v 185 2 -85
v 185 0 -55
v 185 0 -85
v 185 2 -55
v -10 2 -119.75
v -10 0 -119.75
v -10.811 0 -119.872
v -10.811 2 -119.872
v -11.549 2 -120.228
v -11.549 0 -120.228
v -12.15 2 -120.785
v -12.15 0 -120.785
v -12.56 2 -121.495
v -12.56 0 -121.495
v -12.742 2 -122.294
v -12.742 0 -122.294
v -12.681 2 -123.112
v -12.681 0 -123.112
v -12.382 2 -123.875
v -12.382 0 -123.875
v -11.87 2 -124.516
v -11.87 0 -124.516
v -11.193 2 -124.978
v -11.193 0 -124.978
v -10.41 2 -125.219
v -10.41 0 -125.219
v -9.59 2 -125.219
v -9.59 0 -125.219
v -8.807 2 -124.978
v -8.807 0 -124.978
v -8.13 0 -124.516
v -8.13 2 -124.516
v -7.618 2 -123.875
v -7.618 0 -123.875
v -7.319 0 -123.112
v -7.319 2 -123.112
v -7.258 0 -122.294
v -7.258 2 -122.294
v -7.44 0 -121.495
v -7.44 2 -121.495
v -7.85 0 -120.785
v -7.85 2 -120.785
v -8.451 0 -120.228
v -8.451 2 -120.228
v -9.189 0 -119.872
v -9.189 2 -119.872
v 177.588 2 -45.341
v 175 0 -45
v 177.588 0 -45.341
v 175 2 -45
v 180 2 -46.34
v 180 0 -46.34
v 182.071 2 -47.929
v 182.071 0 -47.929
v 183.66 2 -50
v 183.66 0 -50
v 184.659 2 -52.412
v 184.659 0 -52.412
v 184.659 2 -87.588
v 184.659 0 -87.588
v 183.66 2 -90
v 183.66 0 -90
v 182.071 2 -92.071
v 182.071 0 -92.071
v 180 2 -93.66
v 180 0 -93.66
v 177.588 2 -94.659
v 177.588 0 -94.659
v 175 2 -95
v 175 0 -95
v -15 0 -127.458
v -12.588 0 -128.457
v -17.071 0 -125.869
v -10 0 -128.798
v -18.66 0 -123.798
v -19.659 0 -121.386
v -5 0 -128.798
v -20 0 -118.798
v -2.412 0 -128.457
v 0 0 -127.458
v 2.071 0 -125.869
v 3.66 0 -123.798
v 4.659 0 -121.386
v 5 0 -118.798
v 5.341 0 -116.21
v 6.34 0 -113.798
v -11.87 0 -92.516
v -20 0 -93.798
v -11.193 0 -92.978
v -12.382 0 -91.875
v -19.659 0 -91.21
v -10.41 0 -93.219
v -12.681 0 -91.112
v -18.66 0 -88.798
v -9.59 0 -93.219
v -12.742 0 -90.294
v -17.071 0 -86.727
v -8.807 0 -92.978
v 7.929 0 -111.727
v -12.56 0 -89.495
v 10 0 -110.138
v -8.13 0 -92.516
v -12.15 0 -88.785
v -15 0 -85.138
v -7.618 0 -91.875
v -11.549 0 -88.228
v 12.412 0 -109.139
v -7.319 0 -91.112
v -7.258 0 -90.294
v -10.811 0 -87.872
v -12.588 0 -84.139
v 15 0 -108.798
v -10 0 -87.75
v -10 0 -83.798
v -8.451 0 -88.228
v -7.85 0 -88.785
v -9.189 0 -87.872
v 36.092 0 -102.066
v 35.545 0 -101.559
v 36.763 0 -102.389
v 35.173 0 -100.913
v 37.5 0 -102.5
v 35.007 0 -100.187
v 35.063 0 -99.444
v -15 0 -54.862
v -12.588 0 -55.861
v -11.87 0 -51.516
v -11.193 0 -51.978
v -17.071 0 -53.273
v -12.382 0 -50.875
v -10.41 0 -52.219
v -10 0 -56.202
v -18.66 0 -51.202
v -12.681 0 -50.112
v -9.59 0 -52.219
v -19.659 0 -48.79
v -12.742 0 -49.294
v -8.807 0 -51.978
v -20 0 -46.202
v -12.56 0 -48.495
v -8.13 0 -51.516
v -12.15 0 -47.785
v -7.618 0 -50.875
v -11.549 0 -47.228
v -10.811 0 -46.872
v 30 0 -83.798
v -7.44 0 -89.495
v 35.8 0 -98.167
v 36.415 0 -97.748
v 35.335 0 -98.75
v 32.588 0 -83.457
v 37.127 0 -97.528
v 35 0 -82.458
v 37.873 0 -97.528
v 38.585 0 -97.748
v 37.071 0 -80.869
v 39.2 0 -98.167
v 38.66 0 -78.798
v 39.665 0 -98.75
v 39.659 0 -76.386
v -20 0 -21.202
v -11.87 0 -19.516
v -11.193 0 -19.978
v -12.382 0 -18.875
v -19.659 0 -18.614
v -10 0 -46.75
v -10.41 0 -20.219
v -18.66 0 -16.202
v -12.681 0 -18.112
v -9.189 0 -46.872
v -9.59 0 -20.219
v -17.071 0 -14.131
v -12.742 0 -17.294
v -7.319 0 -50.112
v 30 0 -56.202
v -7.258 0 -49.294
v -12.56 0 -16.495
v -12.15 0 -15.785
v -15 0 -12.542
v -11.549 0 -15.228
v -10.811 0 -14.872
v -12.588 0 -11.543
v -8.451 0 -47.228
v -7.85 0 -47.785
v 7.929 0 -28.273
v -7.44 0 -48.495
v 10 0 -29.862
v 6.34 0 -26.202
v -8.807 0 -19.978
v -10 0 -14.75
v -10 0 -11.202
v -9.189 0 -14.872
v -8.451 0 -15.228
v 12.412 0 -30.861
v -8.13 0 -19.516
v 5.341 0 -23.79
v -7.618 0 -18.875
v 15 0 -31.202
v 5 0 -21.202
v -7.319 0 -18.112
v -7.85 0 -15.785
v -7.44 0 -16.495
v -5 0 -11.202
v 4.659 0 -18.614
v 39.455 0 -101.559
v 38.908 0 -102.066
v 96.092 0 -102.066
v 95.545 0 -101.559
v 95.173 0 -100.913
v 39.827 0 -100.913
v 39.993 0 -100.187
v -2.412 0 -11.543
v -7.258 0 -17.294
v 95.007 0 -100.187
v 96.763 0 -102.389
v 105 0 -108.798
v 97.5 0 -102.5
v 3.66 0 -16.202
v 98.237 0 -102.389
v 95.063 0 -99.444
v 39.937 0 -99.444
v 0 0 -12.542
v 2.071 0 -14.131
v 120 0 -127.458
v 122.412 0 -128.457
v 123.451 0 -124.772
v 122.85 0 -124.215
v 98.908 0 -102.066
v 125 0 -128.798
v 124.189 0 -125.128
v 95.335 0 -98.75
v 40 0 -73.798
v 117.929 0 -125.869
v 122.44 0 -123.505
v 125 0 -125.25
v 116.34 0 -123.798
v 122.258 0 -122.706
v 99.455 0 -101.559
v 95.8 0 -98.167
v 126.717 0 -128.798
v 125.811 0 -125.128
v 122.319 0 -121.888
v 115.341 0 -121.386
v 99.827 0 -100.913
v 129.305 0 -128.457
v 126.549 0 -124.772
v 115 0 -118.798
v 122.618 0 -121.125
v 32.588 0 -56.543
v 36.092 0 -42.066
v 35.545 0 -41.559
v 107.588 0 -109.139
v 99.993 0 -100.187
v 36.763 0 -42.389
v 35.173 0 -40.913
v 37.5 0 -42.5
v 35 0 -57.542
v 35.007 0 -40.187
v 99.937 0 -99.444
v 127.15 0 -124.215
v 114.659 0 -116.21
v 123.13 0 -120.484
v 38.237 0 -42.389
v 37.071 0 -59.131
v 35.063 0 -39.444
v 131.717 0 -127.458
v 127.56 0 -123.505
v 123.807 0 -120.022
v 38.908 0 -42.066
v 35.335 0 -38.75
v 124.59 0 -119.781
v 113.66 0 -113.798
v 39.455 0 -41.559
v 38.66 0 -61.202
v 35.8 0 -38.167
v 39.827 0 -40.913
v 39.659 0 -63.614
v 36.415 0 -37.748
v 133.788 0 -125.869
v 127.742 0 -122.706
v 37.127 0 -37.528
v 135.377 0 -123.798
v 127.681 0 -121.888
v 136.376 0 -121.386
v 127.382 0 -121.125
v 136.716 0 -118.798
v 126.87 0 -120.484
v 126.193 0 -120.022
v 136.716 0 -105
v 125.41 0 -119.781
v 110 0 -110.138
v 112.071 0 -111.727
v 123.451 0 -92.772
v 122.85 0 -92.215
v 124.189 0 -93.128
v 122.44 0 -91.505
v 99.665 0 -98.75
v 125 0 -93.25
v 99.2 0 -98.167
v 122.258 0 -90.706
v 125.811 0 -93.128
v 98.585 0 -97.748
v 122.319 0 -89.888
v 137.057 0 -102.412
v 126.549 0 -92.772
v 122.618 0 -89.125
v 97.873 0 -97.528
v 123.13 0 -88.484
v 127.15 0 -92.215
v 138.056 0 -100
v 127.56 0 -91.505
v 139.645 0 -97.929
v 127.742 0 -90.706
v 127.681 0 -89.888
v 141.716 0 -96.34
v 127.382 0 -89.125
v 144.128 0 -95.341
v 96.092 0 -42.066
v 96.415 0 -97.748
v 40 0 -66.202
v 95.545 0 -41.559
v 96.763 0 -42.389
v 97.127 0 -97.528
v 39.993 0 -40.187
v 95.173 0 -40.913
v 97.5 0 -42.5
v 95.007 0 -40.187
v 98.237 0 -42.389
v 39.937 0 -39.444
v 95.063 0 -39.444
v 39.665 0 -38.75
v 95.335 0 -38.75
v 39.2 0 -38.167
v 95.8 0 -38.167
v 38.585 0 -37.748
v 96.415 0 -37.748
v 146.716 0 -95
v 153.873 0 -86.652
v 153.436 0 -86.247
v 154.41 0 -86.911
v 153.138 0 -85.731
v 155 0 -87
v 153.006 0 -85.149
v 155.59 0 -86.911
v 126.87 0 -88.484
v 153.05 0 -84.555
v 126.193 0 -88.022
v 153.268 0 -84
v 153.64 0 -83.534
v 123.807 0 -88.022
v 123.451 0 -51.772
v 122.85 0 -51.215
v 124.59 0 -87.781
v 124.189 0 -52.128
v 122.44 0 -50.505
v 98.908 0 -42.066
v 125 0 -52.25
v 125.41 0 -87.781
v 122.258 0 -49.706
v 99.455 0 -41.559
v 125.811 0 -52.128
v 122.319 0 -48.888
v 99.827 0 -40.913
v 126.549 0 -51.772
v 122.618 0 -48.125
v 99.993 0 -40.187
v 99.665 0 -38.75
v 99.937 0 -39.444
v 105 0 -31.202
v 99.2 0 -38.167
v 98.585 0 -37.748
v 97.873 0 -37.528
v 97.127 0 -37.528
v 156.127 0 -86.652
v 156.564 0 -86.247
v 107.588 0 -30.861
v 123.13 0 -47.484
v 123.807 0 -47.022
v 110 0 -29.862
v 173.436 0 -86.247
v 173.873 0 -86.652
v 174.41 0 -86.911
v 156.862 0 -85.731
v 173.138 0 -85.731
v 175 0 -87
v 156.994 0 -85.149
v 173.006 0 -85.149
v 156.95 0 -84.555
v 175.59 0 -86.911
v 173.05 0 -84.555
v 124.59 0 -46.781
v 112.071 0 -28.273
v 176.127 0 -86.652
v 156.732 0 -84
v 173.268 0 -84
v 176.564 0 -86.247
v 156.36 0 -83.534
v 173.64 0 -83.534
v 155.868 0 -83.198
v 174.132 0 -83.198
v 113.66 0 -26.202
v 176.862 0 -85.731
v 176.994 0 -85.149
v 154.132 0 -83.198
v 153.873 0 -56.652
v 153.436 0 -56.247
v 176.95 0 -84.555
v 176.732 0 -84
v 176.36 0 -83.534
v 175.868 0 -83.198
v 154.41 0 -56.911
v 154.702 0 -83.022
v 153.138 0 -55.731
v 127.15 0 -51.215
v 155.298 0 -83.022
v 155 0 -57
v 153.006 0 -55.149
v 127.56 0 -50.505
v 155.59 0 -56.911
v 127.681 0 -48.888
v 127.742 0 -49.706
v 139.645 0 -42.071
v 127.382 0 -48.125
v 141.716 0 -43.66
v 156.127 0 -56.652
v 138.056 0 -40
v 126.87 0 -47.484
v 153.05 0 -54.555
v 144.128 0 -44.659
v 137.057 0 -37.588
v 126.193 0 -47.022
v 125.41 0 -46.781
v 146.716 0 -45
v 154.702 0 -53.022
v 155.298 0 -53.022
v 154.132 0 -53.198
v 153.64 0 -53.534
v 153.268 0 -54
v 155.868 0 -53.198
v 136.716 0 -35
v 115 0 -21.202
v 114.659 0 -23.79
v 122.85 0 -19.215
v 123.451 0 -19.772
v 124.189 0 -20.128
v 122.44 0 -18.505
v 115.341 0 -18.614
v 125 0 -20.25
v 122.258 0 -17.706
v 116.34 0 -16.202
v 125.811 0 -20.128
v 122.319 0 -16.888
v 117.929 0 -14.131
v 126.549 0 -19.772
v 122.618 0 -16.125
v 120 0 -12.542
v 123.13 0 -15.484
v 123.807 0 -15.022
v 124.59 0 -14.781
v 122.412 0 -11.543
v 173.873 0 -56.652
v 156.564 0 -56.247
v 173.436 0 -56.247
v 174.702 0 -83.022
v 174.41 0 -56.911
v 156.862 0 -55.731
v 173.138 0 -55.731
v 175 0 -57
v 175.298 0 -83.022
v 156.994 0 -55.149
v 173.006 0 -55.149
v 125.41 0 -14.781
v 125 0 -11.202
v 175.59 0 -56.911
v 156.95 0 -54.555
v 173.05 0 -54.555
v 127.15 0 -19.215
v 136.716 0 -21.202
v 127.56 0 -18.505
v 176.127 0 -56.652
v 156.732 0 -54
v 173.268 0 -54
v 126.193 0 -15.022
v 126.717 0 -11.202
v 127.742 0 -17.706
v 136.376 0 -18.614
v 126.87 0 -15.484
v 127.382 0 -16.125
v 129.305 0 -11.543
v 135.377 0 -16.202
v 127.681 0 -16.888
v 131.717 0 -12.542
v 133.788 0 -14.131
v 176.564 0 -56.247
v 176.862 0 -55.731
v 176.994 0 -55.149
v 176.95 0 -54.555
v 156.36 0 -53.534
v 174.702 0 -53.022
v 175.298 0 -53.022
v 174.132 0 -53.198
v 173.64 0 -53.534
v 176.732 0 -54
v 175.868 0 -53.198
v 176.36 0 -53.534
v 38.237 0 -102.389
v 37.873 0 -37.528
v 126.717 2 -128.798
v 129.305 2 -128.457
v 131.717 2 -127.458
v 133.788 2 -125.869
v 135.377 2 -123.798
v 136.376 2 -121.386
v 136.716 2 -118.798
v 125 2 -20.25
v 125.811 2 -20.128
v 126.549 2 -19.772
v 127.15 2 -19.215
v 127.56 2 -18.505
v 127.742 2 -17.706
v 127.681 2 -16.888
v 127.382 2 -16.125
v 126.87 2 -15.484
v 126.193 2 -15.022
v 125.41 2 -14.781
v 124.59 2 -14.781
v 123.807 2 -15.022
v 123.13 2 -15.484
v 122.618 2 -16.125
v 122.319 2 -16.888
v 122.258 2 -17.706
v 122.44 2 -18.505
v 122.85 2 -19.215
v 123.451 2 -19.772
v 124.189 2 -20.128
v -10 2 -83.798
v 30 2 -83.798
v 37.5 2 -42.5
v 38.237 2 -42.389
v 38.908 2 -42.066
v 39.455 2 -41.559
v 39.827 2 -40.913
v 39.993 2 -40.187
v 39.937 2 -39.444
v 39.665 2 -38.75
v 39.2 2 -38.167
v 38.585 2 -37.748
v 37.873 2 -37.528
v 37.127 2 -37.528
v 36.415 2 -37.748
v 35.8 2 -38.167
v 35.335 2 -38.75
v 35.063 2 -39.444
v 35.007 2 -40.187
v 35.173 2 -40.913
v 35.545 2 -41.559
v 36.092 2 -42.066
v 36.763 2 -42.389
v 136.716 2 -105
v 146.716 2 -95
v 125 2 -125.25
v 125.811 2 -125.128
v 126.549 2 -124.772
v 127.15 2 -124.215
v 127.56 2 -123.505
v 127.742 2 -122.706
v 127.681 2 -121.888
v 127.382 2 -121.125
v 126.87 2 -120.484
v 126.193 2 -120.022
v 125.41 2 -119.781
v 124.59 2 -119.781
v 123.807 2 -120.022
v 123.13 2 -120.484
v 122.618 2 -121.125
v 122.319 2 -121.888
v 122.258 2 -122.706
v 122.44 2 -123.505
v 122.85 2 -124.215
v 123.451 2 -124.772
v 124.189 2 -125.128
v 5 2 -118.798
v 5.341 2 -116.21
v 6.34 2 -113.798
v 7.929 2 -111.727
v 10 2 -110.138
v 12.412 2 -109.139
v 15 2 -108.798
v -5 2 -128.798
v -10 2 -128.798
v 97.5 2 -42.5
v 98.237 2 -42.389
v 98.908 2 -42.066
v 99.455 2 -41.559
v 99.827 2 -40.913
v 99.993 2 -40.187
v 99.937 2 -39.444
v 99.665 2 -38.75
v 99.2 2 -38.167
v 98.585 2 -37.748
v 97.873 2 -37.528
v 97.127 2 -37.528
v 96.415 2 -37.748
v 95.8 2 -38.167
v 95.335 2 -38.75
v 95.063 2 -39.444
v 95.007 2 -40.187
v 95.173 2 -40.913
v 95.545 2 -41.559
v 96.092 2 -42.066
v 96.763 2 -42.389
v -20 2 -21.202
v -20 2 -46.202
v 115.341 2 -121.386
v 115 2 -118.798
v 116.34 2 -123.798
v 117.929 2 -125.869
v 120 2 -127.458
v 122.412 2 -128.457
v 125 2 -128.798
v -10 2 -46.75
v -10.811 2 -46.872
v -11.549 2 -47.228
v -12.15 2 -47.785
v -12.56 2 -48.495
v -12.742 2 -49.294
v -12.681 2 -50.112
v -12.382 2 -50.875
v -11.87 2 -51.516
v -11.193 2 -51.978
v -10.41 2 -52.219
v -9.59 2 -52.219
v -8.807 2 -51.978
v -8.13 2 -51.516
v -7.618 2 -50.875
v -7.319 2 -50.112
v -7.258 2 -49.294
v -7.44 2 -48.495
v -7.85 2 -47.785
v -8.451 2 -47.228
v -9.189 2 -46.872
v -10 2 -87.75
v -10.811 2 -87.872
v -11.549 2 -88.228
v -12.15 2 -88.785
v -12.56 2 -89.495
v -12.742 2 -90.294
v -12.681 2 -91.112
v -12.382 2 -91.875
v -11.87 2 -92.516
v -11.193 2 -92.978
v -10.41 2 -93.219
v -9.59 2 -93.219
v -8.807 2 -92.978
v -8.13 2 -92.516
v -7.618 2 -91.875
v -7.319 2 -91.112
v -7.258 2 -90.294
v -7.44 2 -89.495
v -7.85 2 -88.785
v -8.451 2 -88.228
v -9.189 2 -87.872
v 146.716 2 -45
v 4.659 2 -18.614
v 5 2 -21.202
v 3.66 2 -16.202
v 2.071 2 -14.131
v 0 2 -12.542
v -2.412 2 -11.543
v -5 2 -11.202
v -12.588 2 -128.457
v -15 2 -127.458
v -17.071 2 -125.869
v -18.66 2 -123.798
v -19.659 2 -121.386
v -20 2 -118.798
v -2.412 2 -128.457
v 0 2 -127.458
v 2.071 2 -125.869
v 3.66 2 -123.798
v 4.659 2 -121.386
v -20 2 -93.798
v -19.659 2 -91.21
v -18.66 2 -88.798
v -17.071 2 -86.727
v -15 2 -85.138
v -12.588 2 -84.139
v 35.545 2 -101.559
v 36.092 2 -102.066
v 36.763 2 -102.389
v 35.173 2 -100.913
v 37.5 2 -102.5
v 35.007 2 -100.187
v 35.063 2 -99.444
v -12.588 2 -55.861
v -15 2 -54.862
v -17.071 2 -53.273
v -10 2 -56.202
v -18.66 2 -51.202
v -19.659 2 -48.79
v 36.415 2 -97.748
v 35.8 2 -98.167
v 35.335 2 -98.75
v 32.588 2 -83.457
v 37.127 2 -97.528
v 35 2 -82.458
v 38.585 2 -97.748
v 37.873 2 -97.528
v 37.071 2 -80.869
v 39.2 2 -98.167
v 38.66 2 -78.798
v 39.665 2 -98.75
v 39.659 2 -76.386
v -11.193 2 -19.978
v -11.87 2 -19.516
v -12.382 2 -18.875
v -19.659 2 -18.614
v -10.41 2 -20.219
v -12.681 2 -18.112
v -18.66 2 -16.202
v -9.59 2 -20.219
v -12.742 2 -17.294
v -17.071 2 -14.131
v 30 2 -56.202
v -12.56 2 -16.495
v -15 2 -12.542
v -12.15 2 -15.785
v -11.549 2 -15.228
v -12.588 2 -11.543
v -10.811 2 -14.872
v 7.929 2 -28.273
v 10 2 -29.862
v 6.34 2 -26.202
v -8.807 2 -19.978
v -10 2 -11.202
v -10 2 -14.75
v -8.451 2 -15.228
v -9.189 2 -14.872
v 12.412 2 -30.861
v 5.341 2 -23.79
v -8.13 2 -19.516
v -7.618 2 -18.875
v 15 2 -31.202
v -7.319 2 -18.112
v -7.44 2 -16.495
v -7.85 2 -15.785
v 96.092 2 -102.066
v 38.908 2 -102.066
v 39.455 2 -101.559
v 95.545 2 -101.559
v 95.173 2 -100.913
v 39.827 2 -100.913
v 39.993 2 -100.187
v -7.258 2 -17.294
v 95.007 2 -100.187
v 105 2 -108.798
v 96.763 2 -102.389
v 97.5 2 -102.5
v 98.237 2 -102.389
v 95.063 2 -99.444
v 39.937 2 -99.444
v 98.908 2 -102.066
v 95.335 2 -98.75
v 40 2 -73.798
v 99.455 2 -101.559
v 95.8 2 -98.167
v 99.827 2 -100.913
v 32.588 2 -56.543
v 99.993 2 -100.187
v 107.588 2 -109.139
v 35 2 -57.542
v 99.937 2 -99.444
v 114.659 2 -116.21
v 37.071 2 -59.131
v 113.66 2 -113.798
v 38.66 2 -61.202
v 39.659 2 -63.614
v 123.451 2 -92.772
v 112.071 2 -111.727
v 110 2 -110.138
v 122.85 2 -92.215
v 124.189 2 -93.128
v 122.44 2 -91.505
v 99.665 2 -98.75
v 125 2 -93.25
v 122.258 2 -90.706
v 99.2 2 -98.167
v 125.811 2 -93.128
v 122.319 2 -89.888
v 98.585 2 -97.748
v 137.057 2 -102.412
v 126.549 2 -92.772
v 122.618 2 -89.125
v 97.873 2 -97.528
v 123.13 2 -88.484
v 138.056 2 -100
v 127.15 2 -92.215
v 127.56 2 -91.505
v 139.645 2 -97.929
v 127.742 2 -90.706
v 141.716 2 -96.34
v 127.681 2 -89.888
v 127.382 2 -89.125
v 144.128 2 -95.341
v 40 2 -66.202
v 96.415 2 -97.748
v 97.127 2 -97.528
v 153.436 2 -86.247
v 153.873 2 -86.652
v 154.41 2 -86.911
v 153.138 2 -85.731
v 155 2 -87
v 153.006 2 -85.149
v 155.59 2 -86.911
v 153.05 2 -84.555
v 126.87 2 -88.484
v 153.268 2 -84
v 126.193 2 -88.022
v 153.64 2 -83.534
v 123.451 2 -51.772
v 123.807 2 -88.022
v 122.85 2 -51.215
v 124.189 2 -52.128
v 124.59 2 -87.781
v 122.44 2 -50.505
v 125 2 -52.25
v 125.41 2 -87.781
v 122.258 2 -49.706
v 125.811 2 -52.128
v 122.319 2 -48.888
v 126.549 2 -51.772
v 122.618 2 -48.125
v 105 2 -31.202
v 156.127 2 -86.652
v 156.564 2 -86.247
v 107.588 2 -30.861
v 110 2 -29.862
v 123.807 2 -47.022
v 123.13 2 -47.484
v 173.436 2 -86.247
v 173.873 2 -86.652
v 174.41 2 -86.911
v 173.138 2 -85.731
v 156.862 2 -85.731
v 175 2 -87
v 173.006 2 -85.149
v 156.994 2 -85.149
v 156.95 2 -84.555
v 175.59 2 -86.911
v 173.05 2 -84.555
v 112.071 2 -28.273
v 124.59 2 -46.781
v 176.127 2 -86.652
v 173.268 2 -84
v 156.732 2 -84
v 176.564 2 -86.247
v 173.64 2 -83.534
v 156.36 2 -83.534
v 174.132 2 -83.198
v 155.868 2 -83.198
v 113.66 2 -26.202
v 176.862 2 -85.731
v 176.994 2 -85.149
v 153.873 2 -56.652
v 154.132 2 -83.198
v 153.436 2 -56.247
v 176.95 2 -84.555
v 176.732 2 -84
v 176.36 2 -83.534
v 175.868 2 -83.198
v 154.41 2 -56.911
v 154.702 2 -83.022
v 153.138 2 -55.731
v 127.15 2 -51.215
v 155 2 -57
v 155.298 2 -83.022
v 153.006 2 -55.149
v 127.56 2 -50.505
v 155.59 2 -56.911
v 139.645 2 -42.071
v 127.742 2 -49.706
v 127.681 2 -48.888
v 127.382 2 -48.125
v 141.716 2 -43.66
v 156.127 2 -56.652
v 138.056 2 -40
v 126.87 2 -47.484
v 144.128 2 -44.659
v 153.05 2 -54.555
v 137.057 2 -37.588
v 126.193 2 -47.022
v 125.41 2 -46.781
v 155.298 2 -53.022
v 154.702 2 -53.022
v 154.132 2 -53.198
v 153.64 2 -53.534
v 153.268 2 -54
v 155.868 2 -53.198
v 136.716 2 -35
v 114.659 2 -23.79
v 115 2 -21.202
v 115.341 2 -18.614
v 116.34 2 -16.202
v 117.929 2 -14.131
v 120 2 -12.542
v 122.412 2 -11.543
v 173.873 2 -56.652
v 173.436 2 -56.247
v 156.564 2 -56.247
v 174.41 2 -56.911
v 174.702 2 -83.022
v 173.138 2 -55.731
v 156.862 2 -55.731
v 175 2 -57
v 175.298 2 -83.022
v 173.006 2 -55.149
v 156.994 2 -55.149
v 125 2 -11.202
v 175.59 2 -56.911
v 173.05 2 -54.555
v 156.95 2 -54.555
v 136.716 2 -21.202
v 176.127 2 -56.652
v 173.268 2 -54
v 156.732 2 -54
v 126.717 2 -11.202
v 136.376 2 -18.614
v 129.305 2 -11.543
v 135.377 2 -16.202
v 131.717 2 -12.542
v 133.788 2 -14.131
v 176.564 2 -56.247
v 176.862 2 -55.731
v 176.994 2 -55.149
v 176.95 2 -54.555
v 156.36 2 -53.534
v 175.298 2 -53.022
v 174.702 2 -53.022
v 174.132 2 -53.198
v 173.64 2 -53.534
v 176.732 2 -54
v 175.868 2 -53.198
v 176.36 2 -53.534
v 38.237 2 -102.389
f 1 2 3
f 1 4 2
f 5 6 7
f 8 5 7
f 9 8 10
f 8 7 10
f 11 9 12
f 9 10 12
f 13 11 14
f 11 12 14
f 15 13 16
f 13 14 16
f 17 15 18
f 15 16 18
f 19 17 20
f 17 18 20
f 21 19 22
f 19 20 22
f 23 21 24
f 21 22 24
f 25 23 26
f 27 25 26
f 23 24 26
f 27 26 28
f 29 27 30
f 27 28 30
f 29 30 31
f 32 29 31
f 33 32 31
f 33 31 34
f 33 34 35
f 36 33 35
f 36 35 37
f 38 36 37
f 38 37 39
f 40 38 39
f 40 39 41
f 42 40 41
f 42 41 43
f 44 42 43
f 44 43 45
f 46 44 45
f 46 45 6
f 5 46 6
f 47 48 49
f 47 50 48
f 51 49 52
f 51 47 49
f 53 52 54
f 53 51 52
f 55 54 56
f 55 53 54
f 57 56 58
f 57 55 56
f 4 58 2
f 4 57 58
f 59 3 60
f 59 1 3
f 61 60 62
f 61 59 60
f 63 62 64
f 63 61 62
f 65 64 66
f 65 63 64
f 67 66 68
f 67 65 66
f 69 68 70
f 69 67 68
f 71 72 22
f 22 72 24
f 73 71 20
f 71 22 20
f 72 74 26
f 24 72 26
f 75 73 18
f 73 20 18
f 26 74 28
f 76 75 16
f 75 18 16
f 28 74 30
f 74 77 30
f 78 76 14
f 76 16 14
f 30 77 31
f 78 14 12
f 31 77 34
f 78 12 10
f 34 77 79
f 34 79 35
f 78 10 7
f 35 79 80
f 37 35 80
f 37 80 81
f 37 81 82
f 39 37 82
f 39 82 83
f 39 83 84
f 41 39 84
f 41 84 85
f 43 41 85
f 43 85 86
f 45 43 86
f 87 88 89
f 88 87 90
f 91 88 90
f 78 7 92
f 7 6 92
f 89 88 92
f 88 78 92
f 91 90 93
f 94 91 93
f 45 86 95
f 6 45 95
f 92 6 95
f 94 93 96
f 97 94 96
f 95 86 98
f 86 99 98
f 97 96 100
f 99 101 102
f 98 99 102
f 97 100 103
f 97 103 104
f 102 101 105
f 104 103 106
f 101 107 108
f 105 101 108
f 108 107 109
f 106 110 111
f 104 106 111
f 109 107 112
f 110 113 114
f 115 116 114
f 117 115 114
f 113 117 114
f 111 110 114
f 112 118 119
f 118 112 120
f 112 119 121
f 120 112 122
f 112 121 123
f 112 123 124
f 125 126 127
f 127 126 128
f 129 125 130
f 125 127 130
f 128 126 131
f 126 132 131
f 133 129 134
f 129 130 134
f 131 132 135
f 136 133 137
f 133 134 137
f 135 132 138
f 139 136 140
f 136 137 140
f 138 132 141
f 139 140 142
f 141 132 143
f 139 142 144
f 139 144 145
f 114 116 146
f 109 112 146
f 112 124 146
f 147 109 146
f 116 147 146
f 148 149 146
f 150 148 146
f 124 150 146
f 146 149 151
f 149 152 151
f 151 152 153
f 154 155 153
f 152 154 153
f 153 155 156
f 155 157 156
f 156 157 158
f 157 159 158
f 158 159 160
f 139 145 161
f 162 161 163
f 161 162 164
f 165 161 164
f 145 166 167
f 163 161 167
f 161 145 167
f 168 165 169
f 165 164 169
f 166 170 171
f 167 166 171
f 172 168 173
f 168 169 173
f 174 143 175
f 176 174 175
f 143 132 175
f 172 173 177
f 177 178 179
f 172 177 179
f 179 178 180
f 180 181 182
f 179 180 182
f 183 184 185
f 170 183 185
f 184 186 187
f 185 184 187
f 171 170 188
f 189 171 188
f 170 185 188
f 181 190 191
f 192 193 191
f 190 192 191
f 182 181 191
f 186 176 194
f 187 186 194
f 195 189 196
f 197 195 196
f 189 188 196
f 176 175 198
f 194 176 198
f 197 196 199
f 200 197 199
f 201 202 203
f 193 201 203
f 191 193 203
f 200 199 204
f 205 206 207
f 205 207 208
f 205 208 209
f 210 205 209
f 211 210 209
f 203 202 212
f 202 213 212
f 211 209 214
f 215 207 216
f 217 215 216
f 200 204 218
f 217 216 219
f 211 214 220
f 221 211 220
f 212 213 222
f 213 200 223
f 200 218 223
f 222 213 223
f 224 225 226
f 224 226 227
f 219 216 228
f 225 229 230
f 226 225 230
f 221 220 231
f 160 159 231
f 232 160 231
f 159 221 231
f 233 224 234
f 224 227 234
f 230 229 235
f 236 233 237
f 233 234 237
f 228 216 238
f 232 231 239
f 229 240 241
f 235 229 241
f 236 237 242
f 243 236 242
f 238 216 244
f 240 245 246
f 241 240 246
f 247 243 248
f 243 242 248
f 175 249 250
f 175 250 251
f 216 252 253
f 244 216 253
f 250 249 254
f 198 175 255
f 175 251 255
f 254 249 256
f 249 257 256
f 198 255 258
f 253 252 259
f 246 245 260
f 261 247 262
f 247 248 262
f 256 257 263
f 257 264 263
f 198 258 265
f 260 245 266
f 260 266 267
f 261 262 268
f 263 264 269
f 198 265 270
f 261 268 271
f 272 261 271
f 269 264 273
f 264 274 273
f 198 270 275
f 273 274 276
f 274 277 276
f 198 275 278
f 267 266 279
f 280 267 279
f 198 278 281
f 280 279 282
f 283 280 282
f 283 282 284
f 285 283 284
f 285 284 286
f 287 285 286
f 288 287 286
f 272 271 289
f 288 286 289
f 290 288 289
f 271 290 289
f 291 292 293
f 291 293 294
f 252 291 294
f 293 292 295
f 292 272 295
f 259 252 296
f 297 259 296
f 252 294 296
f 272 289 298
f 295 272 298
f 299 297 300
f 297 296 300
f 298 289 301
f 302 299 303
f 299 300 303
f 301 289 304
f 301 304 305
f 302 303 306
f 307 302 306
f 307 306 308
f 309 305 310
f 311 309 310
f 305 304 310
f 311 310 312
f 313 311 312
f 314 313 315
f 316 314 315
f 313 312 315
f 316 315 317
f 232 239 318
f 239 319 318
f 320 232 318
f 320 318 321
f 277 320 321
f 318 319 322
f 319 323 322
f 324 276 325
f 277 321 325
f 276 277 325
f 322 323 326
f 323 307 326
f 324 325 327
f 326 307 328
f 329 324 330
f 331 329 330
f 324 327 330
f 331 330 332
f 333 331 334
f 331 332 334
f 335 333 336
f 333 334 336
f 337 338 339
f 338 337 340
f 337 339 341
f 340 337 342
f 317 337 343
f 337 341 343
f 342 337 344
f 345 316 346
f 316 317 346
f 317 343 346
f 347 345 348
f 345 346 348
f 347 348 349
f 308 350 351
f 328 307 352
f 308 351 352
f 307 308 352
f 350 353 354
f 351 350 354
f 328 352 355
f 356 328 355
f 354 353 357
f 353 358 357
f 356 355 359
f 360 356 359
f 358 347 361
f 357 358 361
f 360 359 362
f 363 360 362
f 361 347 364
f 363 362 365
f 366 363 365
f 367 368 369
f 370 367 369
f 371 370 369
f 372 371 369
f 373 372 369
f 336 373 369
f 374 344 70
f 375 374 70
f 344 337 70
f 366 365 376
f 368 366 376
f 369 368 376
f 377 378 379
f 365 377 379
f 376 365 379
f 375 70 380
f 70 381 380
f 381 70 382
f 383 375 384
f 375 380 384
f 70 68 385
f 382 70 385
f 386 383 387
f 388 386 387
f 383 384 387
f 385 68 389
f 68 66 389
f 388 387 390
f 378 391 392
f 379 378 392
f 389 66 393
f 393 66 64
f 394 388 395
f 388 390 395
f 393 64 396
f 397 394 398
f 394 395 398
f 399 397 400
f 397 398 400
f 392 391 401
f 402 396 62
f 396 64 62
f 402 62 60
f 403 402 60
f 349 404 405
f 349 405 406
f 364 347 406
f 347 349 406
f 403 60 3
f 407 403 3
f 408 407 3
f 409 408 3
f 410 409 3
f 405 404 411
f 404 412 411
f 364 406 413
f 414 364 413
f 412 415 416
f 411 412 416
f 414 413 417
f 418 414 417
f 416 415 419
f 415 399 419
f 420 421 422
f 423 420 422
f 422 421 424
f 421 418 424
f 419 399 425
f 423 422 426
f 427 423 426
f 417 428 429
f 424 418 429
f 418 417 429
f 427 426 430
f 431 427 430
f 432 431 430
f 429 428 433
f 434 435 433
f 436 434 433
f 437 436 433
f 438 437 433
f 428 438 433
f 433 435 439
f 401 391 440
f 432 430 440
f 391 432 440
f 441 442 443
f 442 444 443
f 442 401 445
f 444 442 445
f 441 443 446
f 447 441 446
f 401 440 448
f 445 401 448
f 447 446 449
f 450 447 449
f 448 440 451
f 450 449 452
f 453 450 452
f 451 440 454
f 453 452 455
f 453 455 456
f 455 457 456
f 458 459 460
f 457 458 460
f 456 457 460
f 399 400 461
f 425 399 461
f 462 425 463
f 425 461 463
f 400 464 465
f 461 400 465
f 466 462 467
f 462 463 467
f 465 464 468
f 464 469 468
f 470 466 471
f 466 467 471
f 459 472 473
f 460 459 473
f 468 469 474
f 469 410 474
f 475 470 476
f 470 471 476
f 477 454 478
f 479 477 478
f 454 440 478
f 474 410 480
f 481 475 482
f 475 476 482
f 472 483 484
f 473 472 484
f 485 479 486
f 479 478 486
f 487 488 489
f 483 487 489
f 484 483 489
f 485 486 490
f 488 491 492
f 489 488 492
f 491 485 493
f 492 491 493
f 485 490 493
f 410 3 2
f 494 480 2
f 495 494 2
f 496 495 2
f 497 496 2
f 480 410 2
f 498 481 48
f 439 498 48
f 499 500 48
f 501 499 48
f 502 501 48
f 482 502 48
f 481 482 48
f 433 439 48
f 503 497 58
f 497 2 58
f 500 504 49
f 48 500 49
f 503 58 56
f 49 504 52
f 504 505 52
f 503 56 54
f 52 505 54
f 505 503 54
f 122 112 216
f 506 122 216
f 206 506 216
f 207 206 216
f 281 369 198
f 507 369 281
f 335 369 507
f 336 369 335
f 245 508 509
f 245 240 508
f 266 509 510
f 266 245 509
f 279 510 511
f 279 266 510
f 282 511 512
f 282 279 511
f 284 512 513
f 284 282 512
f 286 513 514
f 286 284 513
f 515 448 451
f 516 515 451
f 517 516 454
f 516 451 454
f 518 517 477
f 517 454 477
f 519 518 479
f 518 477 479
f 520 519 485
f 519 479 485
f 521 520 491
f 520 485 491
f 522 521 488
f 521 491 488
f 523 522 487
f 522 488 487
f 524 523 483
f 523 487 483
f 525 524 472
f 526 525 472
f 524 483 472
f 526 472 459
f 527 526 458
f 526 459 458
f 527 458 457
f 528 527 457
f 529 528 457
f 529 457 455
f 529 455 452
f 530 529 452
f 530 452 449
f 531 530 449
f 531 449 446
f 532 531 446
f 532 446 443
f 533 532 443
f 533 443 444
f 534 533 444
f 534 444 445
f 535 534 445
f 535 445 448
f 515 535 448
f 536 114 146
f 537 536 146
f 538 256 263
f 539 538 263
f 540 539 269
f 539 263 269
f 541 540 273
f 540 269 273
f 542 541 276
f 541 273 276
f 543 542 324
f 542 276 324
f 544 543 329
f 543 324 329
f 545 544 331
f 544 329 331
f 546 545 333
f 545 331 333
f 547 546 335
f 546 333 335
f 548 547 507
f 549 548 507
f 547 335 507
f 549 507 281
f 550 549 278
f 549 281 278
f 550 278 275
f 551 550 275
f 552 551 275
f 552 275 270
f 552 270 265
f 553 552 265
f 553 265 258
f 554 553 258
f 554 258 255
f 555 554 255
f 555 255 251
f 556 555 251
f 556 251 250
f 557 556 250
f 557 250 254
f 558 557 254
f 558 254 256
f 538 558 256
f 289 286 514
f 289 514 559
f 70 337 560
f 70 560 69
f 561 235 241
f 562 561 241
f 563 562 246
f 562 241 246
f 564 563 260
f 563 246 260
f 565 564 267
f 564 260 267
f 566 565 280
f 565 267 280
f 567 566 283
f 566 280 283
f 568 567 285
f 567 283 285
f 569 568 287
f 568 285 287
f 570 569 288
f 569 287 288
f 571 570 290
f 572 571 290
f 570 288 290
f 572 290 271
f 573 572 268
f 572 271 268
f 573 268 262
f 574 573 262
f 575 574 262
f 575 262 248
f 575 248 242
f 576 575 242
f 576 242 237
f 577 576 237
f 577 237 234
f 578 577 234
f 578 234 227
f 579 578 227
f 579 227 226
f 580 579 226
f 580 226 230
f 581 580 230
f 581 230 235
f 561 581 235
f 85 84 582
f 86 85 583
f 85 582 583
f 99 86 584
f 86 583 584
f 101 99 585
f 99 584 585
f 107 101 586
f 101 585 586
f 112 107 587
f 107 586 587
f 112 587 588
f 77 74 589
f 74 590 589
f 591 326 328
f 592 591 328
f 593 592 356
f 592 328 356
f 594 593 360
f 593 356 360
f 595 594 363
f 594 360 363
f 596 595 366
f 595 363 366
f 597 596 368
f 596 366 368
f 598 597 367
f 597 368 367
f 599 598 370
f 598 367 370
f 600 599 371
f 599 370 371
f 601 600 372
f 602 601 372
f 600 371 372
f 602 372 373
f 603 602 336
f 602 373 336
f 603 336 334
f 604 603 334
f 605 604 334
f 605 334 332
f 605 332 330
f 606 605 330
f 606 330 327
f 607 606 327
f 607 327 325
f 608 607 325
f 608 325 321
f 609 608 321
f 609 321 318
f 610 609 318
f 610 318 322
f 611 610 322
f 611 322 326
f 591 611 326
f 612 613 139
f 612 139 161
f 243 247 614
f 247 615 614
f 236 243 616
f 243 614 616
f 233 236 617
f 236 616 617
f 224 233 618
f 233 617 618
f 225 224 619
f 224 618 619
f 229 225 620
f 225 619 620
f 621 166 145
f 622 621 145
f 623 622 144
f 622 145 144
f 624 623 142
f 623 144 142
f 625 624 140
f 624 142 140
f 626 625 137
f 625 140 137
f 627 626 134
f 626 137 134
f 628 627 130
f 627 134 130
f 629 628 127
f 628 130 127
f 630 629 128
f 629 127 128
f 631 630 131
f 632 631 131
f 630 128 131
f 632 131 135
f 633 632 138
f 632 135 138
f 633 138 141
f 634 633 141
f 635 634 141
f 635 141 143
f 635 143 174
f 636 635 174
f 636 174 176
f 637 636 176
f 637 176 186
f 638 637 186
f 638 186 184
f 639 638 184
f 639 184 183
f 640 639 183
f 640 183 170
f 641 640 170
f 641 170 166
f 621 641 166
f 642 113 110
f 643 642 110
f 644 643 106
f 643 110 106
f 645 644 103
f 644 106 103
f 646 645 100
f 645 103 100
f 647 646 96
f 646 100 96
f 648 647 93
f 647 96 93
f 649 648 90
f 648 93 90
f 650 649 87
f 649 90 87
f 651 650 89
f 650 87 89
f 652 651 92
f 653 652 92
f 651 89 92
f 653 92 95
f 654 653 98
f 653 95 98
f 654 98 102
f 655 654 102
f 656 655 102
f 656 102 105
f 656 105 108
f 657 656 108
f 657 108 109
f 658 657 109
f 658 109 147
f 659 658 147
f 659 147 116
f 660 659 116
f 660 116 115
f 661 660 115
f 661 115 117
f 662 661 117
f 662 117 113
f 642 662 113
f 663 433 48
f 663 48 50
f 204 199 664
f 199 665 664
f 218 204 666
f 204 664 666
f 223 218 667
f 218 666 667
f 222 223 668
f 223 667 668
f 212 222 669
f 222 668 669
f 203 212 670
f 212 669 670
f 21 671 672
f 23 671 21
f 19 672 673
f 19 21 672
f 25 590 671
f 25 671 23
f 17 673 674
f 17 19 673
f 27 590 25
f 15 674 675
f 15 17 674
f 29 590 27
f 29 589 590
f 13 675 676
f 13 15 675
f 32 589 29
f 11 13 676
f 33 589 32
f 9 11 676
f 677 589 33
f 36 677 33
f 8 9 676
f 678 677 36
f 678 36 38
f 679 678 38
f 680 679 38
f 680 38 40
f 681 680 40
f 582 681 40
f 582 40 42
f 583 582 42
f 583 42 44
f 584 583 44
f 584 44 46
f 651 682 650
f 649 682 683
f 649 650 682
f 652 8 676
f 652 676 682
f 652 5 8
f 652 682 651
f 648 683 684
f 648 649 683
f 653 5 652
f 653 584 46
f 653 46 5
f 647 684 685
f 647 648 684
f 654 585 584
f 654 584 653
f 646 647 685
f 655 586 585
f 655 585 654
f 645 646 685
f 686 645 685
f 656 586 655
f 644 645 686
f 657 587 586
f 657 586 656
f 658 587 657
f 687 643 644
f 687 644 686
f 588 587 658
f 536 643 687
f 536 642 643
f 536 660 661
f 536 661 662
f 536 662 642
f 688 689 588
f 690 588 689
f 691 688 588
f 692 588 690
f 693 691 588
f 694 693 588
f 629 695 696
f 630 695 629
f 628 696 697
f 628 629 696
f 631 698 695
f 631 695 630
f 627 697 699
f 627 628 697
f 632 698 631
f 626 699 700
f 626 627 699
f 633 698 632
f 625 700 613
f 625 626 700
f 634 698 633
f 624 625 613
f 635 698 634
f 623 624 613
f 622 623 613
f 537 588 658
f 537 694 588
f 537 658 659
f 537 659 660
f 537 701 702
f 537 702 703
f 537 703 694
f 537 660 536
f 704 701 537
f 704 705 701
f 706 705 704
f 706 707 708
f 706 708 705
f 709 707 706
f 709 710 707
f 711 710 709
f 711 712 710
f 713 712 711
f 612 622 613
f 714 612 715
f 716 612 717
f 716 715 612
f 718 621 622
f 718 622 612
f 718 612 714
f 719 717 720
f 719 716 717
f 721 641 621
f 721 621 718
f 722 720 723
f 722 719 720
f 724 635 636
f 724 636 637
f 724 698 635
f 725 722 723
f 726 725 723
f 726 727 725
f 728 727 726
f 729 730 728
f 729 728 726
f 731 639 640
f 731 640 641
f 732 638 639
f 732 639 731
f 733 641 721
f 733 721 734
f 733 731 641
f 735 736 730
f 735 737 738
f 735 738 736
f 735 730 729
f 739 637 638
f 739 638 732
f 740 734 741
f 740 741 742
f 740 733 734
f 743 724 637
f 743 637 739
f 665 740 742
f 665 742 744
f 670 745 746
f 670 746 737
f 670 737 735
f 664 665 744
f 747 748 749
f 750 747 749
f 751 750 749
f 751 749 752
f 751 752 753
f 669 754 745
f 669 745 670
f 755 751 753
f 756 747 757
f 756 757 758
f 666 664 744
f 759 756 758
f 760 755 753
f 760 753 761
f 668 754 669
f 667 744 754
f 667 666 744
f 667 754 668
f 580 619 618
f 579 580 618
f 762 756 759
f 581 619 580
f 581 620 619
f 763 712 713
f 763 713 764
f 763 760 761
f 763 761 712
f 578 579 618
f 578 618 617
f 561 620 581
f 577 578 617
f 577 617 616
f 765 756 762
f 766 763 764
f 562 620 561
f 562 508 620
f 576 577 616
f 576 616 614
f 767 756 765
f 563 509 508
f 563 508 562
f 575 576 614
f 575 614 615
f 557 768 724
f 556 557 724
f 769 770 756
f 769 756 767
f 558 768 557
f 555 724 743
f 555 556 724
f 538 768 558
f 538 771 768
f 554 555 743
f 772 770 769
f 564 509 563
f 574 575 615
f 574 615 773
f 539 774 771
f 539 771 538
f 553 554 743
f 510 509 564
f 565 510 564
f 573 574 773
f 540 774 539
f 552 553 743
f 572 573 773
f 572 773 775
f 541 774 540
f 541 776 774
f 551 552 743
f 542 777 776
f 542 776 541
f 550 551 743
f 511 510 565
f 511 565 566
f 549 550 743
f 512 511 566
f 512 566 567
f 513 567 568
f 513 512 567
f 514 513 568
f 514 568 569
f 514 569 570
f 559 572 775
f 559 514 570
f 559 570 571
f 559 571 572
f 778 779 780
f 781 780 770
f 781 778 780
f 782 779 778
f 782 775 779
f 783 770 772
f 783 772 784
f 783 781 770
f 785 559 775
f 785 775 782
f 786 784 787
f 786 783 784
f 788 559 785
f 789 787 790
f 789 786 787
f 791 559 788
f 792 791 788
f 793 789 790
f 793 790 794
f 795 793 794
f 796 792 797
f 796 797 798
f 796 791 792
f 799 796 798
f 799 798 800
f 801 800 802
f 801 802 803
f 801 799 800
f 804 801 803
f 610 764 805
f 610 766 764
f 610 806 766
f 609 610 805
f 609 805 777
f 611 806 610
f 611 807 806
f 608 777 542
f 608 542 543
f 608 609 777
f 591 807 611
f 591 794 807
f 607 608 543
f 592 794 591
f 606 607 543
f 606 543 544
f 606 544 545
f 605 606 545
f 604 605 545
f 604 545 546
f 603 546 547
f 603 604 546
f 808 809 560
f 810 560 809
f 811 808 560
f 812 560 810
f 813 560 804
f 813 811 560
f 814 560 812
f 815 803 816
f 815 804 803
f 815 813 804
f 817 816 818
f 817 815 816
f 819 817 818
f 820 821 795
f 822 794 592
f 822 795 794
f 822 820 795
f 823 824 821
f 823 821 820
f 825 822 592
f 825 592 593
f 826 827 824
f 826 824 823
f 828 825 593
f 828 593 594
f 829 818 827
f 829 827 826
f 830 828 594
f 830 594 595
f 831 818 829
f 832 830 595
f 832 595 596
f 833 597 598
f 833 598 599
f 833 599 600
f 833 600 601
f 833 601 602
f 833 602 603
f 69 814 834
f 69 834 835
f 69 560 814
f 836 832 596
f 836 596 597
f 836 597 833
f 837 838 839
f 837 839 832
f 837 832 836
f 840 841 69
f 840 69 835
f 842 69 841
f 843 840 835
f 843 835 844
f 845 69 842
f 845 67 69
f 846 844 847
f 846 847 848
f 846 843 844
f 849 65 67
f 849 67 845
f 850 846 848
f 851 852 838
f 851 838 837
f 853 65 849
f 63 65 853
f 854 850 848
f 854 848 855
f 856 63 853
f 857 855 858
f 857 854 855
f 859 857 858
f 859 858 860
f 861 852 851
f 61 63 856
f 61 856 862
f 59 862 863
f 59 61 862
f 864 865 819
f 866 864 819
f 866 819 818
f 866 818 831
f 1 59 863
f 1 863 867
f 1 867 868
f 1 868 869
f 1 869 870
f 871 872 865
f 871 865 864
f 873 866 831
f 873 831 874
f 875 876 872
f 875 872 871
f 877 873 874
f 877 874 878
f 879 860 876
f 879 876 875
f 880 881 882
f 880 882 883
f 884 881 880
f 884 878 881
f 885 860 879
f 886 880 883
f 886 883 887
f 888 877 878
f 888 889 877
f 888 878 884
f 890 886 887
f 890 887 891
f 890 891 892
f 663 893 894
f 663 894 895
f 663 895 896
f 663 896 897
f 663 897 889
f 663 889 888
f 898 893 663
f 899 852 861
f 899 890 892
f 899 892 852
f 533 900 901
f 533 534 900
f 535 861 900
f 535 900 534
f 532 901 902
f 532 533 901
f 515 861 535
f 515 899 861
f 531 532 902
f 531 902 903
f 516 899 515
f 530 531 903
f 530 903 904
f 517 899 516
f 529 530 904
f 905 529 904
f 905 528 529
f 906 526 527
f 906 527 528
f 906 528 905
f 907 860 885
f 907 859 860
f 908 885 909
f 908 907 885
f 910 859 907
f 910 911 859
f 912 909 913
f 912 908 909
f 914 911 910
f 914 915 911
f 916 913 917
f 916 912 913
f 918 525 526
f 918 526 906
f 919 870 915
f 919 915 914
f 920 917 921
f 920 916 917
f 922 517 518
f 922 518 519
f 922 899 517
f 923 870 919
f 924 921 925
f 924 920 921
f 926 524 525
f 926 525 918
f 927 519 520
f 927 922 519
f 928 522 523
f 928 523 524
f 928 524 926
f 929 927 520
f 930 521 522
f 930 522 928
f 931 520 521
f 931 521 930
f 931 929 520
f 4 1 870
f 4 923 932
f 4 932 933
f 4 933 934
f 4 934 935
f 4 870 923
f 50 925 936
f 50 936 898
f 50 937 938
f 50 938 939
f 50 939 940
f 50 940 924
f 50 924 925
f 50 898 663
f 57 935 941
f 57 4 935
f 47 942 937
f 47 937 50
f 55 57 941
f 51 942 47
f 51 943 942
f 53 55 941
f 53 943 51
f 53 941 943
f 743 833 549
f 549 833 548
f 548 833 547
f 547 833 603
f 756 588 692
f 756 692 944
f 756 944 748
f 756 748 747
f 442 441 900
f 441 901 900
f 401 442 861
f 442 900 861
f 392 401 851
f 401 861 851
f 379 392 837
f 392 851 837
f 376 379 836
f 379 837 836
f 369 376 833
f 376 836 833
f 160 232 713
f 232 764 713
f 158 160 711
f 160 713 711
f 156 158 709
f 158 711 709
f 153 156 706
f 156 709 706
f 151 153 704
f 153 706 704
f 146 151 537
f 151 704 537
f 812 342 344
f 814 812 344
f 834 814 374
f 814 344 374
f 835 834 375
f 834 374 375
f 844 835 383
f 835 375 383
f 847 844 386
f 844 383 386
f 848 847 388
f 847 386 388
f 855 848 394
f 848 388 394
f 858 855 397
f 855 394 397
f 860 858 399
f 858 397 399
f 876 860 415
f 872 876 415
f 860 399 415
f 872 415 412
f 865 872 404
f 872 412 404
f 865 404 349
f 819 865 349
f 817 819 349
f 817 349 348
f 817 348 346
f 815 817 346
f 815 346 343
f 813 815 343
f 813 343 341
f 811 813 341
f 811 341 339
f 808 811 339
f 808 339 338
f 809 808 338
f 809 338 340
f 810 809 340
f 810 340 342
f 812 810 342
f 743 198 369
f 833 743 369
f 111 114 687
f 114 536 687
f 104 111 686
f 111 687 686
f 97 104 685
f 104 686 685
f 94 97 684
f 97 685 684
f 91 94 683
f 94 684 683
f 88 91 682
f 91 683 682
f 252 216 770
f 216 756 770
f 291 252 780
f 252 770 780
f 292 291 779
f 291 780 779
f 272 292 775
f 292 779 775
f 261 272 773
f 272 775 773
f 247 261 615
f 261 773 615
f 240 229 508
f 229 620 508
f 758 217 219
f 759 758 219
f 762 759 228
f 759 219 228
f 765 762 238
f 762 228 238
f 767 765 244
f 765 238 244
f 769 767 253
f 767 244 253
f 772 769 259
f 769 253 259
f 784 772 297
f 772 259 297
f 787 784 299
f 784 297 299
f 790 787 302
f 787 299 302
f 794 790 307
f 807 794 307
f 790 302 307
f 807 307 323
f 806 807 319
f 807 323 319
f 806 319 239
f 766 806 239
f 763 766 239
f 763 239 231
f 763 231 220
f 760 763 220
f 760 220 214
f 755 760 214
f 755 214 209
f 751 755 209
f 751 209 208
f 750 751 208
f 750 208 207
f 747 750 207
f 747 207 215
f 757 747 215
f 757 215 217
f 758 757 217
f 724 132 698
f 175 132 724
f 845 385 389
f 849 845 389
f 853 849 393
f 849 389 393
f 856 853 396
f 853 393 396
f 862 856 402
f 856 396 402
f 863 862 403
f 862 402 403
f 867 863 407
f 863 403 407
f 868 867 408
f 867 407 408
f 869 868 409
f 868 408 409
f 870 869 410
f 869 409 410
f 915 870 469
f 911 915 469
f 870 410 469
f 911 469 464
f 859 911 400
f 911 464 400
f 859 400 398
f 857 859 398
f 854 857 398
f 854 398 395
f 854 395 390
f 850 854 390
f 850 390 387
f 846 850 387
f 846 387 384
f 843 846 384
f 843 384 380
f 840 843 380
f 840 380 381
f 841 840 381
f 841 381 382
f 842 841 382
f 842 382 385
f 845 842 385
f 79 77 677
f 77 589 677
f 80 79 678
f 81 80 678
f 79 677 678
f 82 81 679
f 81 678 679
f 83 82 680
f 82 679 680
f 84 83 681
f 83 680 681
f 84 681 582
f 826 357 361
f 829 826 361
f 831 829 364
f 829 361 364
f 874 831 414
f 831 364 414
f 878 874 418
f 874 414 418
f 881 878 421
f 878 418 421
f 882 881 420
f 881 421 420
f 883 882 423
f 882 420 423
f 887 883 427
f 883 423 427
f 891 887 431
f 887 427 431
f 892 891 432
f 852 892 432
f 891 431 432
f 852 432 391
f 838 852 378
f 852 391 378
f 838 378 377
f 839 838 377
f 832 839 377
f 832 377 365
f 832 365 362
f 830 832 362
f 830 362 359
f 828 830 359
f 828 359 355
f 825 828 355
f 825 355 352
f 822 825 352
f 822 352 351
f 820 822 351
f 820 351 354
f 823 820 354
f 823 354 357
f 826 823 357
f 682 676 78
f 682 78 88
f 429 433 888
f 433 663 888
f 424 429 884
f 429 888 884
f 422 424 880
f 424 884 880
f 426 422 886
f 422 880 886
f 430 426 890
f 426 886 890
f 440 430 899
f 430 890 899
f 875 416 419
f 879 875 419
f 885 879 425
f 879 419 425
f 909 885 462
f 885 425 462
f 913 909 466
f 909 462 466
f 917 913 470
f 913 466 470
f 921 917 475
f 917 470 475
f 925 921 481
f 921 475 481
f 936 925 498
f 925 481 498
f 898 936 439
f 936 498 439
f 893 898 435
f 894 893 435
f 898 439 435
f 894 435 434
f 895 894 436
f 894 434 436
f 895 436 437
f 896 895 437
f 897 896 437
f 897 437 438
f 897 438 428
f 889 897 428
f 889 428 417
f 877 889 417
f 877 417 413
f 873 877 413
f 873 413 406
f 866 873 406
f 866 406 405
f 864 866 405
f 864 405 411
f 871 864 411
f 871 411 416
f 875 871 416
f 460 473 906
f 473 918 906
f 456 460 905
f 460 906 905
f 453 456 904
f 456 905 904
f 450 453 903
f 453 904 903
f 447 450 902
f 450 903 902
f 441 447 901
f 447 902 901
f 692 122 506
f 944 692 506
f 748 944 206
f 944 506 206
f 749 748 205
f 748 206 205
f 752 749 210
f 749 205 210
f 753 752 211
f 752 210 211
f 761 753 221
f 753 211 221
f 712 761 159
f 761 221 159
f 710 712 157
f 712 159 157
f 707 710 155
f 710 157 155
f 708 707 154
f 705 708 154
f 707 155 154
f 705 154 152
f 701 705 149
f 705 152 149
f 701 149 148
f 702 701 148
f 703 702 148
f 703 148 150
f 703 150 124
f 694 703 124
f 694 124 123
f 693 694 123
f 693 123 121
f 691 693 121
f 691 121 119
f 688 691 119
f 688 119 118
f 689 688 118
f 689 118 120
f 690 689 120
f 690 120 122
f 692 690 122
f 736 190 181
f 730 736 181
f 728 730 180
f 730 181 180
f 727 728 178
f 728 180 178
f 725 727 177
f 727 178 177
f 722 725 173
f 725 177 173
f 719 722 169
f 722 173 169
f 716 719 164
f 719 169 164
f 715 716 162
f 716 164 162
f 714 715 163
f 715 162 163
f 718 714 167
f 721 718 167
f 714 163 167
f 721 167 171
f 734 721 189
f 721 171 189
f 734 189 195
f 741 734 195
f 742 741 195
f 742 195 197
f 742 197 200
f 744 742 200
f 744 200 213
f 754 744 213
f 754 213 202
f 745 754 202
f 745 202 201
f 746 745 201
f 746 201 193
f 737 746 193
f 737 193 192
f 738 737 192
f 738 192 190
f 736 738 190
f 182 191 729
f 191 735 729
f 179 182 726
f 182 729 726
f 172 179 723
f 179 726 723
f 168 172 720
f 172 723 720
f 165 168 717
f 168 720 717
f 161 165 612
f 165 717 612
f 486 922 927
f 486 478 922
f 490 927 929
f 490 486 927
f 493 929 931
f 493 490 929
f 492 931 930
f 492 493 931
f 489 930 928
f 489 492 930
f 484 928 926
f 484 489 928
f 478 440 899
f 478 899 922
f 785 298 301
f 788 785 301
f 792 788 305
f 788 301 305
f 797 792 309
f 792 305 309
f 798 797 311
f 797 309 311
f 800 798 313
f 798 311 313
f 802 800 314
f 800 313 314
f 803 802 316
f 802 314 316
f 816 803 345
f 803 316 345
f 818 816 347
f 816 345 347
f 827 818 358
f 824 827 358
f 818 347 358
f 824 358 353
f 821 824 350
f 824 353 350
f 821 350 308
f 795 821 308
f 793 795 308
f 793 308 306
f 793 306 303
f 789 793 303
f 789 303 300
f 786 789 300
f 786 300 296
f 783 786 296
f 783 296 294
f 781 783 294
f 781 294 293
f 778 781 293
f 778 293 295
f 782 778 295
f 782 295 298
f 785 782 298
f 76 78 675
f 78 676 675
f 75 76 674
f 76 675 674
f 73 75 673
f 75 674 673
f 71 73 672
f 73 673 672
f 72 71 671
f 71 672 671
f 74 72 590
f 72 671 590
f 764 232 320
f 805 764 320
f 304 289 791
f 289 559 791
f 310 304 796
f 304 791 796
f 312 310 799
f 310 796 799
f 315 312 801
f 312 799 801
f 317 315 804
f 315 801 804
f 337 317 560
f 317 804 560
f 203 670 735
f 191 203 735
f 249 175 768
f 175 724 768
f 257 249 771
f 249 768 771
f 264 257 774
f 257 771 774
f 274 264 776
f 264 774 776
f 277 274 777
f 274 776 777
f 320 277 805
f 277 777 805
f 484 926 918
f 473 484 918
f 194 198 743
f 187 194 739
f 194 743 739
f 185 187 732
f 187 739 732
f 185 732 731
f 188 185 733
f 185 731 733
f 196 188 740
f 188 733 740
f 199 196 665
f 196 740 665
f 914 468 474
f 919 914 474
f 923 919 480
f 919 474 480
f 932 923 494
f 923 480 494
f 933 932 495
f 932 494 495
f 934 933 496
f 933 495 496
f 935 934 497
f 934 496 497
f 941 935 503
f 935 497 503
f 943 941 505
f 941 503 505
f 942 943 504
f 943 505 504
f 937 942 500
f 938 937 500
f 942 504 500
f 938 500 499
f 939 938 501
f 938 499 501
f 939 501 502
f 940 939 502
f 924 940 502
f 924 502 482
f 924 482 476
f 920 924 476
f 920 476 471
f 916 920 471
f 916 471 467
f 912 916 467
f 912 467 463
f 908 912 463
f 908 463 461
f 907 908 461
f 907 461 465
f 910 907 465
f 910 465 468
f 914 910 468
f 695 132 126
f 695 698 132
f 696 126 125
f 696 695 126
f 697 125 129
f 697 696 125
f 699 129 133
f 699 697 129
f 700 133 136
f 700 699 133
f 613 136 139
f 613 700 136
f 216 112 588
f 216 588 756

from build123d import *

# Parameters (mm, degrees)
SKETCH1_W           = 80
SKETCH1_H           = 140
BOSS_EXTRUDE1_DEPTH = 2
SKETCH4_W           = 140
SKETCH4_H           = 2
BOSS_EXTRUDE2_DEPTH = 35
SKETCH5_W           = 140
SKETCH5_H           = 2
BOSS_EXTRUDE3_DEPTH = 20
SKETCH2_R           = 2.5
CUT_EXTRUDE1_DEPTH  = 10
SKETCH7_W           = 140
SKETCH7_H           = 2
BOSS_EXTRUDE5_DEPTH = 20
SKETCH8_R           = 2.75
CUT_EXTRUDE2_DEPTH  = 10
SKETCH9_W           = 50
SKETCH9_H           = 2
BOSS_EXTRUDE6_DEPTH = 50
SKETCH10_R          = 2
CUT_EXTRUDE3_DEPTH  = 40
CUT_EXTRUDE4_DEPTH  = 40
CHAMFER1_SIZE       = 49.985180236
CHAMFER1_SIZE_2     = 35
SKETCH12_W          = 60
SKETCH12_H          = 27.596233816
CUT_EXTRUDE5_DEPTH  = 10
CUT_EXTRUDE6_DEPTH  = 10
SKETCH14_W          = 110
SKETCH14_H          = 20
CUT_EXTRUDE7_DEPTH  = 10
FILLET1_R           = 10


# Some blends are built 0.0001 mm under size
with BuildPart() as part:
    # Sketch1 → Boss-Extrude1 (new body)
    with BuildSketch(Plane(origin=(0, 0, 0), x_dir=(1, 0, 0), z_dir=(0, 1, 0))):
        with Locations((40, 70)):
            Rectangle(SKETCH1_W, SKETCH1_H)
    extrude(amount=BOSS_EXTRUDE1_DEPTH)

    # Sketch4 → Boss-Extrude2 (add)
    with BuildSketch(Plane(origin=(80, 0, 0), x_dir=(0, 0, -1), z_dir=(1, 0, 0))):
        with Locations((70, 1)):
            Rectangle(SKETCH4_W, SKETCH4_H)
    extrude(amount=BOSS_EXTRUDE2_DEPTH)

    # Sketch5 → Boss-Extrude3 (add)
    with BuildSketch(Plane(origin=(115, 0, 0), x_dir=(0, 0, -1), z_dir=(1, 0, 0))):
        with Locations((70, 1)):
            Rectangle(SKETCH5_W, SKETCH5_H)
    extrude(amount=BOSS_EXTRUDE3_DEPTH)

    # Sketch2 → Cut-Extrude1 (cut)
    with BuildSketch(Plane.XZ):
        with Locations(Location((97.5, -100, 0), (0, 0, 270))):
            Circle(SKETCH2_R)
        with Locations(Location((97.5, -40, 0), (0, 0, 270))):
            Circle(SKETCH2_R)
        with Locations(Location((37.5, -40, 0), (0, 0, 270))):
            Circle(SKETCH2_R)
        with Locations(Location((37.5, -100, 0), (0, 0, 270))):
            Circle(SKETCH2_R)
    extrude(amount=-CUT_EXTRUDE1_DEPTH, mode=Mode.SUBTRACT)

    # Sketch7 → Boss-Extrude5 (add)
    with BuildSketch(Plane.ZY):
        with Locations((-70, 1)):
            Rectangle(SKETCH7_W, SKETCH7_H)
    extrude(amount=BOSS_EXTRUDE5_DEPTH)

    # Sketch8 → Cut-Extrude2 (cut)
    with BuildSketch(Plane.XZ):
        with Locations(Location((125, -17.5, 0), (0, 0, 270))):
            Circle(SKETCH8_R)
        with Locations(Location((125, -49.5, 0), (0, 0, 270))):
            Circle(SKETCH8_R)
        with Locations(Location((125, -90.5, 0), (0, 0, 270))):
            Circle(SKETCH8_R)
        with Locations(Location((125, -122.5, 0), (0, 0, 270))):
            Circle(SKETCH8_R)
        with Locations(Location((-10, -122.5, 0), (0, 0, 90))):
            Circle(SKETCH8_R)
        with Locations(Location((-10, -90.5, 0), (0, 0, 90))):
            Circle(SKETCH8_R)
        with Locations(Location((-10, -49.5, 0), (0, 0, 90))):
            Circle(SKETCH8_R)
        with Locations(Location((-10, -17.5, 0), (0, 0, 90))):
            Circle(SKETCH8_R)
    extrude(amount=-CUT_EXTRUDE2_DEPTH, mode=Mode.SUBTRACT)

    # Sketch9 → Boss-Extrude6 (add)
    with BuildSketch(Plane(origin=(135, 0, 0), x_dir=(0, 0, -1), z_dir=(1, 0, 0))):
        with Locations((70, 1)):
            Rectangle(SKETCH9_W, SKETCH9_H)
    extrude(amount=BOSS_EXTRUDE6_DEPTH)

    # Sketch10 → Cut-Extrude3 (cut)
    with BuildSketch(Plane.XZ):
        with Locations(Location((175, -55, 0), (0, 0, 270))):
            Circle(SKETCH10_R)
        with Locations(Location((175, -85, 0), (0, 0, 270))):
            Circle(SKETCH10_R)
        with Locations(Location((155, -85, 0), (0, 0, 270))):
            Circle(SKETCH10_R)
        with Locations(Location((155, -55, 0), (0, 0, 270))):
            Circle(SKETCH10_R)
    extrude(amount=-CUT_EXTRUDE3_DEPTH, mode=Mode.SUBTRACT)

    # Sketch11 → Cut-Extrude4 (cut)
    with BuildSketch(Plane.XZ):
        Polygon((135, -11.201883092), (22.258688724, -11.201883092), (-20, -11.201883092), (-20, 0), (135, 0), align=None)
        Polygon((135, -140), (135, -128.798116908), (22.258688724, -128.798116908), (-20, -128.798116908), (-20, -140), align=None)
    extrude(amount=-CUT_EXTRUDE4_DEPTH, mode=Mode.SUBTRACT)

    # Chamfer1
    # the kernel refuses this chamfer: 49.985180236, 35 mm, written as the material it adds along each edge
    with BuildSketch(Plane(origin=(135, 2, -95), x_dir=(0.9997533347641299, 0, 0.022209674198457038), z_dir=(0, -1, 0))) as chamfer1_piece_1_section:
        Polygon((CHAMFER1_SIZE * 0.999753334764, -CHAMFER1_SIZE * 0.0222096741984), (-CHAMFER1_SIZE_2 * 0.0222096741985, -CHAMFER1_SIZE_2 * 0.999753334764), (0, 0), align=None)
    chamfer1_piece_1 = extrude(amount=2, mode=Mode.PRIVATE)
    chamfer1_piece_1 = split(chamfer1_piece_1, bisect_by=Plane(origin=(151.760683993, 1, -128.798116908), z_dir=(0, 0, 1)), keep=Keep.TOP, mode=Mode.PRIVATE)
    add(chamfer1_piece_1)
    with BuildSketch(Plane(origin=(135, 0, -45), x_dir=(-0.045263737714021514, 0, 0.9989750717851553), z_dir=(0, 1, 0))) as chamfer1_piece_2_section:
        Polygon((CHAMFER1_SIZE_2 * 0.998975071785, CHAMFER1_SIZE_2 * 0.045263737714), (-CHAMFER1_SIZE * 0.045263737714, CHAMFER1_SIZE * 0.998975071785), (0, 0), align=None)
    chamfer1_piece_2 = extrude(amount=2, mode=Mode.PRIVATE)
    chamfer1_piece_2 = split(chamfer1_piece_2, bisect_by=Plane(origin=(151.760683993, 1, -11.201883092), z_dir=(0, 0, -1)), keep=Keep.TOP, mode=Mode.PRIVATE)
    add(chamfer1_piece_2)

    # Sketch12 → Cut-Extrude5 (cut)
    with BuildSketch(Plane.XZ):
        with Locations((10, -70)):
            Rectangle(SKETCH12_W, SKETCH12_H)
    extrude(amount=-CUT_EXTRUDE5_DEPTH, mode=Mode.SUBTRACT)

    # Sketch13 → Cut-Extrude6 (cut)
    with BuildSketch(Plane.XZ):
        Polygon((184.985180236, -45), (136.716466943, -45), (136.716466943, -11.201883092), align=None)
        Polygon((184.985180236, -95), (136.716466943, -128.798116908), (136.716466943, -95), align=None)
    extrude(amount=-CUT_EXTRUDE6_DEPTH, mode=Mode.SUBTRACT)

    # Sketch14 → Cut-Extrude7 (cut)
    with BuildSketch(Plane.XZ):
        with Locations((60, -21.201883092)):
            Rectangle(SKETCH14_W, SKETCH14_H)
        with Locations((60, -118.798116908)):
            Rectangle(SKETCH14_W, SKETCH14_H)
    extrude(amount=-CUT_EXTRUDE7_DEPTH, mode=Mode.SUBTRACT)

    # Fillet1
    fillet1_edges = [part.edges().sort_by_distance(p)[0] for p in [
        (185, 1, -45),
        (185, 1, -95),
        (-20, 1, -128.798116908),
        (-20, 1, -11.201883092),
        (136.716466943, 1, -128.798116908),
        (136.716466943, 1, -11.201883092),
        (-20, 1, -83.798116908),
        (-20, 1, -56.201883092),
        (40, 1, -56.201883092),
        (40, 1, -83.798116908),
        (136.716466943, 1, -45),
        (136.716466943, 1, -95),
        (115, 1, -11.201883092),
        (5, 1, -11.201883092),
        (5, 1, -128.798116908),
        (115, 1, -128.798116908),
        (5, 1, -31.201883092),
        (115, 1, -31.201883092),
        (115, 1, -108.798116908),
        (5, 1, -108.798116908),
    ]]
    fillet(fillet1_edges, radius=FILLET1_R - 0.0001)  # a hair under: the kernel refuses the full size


solid = part.part
